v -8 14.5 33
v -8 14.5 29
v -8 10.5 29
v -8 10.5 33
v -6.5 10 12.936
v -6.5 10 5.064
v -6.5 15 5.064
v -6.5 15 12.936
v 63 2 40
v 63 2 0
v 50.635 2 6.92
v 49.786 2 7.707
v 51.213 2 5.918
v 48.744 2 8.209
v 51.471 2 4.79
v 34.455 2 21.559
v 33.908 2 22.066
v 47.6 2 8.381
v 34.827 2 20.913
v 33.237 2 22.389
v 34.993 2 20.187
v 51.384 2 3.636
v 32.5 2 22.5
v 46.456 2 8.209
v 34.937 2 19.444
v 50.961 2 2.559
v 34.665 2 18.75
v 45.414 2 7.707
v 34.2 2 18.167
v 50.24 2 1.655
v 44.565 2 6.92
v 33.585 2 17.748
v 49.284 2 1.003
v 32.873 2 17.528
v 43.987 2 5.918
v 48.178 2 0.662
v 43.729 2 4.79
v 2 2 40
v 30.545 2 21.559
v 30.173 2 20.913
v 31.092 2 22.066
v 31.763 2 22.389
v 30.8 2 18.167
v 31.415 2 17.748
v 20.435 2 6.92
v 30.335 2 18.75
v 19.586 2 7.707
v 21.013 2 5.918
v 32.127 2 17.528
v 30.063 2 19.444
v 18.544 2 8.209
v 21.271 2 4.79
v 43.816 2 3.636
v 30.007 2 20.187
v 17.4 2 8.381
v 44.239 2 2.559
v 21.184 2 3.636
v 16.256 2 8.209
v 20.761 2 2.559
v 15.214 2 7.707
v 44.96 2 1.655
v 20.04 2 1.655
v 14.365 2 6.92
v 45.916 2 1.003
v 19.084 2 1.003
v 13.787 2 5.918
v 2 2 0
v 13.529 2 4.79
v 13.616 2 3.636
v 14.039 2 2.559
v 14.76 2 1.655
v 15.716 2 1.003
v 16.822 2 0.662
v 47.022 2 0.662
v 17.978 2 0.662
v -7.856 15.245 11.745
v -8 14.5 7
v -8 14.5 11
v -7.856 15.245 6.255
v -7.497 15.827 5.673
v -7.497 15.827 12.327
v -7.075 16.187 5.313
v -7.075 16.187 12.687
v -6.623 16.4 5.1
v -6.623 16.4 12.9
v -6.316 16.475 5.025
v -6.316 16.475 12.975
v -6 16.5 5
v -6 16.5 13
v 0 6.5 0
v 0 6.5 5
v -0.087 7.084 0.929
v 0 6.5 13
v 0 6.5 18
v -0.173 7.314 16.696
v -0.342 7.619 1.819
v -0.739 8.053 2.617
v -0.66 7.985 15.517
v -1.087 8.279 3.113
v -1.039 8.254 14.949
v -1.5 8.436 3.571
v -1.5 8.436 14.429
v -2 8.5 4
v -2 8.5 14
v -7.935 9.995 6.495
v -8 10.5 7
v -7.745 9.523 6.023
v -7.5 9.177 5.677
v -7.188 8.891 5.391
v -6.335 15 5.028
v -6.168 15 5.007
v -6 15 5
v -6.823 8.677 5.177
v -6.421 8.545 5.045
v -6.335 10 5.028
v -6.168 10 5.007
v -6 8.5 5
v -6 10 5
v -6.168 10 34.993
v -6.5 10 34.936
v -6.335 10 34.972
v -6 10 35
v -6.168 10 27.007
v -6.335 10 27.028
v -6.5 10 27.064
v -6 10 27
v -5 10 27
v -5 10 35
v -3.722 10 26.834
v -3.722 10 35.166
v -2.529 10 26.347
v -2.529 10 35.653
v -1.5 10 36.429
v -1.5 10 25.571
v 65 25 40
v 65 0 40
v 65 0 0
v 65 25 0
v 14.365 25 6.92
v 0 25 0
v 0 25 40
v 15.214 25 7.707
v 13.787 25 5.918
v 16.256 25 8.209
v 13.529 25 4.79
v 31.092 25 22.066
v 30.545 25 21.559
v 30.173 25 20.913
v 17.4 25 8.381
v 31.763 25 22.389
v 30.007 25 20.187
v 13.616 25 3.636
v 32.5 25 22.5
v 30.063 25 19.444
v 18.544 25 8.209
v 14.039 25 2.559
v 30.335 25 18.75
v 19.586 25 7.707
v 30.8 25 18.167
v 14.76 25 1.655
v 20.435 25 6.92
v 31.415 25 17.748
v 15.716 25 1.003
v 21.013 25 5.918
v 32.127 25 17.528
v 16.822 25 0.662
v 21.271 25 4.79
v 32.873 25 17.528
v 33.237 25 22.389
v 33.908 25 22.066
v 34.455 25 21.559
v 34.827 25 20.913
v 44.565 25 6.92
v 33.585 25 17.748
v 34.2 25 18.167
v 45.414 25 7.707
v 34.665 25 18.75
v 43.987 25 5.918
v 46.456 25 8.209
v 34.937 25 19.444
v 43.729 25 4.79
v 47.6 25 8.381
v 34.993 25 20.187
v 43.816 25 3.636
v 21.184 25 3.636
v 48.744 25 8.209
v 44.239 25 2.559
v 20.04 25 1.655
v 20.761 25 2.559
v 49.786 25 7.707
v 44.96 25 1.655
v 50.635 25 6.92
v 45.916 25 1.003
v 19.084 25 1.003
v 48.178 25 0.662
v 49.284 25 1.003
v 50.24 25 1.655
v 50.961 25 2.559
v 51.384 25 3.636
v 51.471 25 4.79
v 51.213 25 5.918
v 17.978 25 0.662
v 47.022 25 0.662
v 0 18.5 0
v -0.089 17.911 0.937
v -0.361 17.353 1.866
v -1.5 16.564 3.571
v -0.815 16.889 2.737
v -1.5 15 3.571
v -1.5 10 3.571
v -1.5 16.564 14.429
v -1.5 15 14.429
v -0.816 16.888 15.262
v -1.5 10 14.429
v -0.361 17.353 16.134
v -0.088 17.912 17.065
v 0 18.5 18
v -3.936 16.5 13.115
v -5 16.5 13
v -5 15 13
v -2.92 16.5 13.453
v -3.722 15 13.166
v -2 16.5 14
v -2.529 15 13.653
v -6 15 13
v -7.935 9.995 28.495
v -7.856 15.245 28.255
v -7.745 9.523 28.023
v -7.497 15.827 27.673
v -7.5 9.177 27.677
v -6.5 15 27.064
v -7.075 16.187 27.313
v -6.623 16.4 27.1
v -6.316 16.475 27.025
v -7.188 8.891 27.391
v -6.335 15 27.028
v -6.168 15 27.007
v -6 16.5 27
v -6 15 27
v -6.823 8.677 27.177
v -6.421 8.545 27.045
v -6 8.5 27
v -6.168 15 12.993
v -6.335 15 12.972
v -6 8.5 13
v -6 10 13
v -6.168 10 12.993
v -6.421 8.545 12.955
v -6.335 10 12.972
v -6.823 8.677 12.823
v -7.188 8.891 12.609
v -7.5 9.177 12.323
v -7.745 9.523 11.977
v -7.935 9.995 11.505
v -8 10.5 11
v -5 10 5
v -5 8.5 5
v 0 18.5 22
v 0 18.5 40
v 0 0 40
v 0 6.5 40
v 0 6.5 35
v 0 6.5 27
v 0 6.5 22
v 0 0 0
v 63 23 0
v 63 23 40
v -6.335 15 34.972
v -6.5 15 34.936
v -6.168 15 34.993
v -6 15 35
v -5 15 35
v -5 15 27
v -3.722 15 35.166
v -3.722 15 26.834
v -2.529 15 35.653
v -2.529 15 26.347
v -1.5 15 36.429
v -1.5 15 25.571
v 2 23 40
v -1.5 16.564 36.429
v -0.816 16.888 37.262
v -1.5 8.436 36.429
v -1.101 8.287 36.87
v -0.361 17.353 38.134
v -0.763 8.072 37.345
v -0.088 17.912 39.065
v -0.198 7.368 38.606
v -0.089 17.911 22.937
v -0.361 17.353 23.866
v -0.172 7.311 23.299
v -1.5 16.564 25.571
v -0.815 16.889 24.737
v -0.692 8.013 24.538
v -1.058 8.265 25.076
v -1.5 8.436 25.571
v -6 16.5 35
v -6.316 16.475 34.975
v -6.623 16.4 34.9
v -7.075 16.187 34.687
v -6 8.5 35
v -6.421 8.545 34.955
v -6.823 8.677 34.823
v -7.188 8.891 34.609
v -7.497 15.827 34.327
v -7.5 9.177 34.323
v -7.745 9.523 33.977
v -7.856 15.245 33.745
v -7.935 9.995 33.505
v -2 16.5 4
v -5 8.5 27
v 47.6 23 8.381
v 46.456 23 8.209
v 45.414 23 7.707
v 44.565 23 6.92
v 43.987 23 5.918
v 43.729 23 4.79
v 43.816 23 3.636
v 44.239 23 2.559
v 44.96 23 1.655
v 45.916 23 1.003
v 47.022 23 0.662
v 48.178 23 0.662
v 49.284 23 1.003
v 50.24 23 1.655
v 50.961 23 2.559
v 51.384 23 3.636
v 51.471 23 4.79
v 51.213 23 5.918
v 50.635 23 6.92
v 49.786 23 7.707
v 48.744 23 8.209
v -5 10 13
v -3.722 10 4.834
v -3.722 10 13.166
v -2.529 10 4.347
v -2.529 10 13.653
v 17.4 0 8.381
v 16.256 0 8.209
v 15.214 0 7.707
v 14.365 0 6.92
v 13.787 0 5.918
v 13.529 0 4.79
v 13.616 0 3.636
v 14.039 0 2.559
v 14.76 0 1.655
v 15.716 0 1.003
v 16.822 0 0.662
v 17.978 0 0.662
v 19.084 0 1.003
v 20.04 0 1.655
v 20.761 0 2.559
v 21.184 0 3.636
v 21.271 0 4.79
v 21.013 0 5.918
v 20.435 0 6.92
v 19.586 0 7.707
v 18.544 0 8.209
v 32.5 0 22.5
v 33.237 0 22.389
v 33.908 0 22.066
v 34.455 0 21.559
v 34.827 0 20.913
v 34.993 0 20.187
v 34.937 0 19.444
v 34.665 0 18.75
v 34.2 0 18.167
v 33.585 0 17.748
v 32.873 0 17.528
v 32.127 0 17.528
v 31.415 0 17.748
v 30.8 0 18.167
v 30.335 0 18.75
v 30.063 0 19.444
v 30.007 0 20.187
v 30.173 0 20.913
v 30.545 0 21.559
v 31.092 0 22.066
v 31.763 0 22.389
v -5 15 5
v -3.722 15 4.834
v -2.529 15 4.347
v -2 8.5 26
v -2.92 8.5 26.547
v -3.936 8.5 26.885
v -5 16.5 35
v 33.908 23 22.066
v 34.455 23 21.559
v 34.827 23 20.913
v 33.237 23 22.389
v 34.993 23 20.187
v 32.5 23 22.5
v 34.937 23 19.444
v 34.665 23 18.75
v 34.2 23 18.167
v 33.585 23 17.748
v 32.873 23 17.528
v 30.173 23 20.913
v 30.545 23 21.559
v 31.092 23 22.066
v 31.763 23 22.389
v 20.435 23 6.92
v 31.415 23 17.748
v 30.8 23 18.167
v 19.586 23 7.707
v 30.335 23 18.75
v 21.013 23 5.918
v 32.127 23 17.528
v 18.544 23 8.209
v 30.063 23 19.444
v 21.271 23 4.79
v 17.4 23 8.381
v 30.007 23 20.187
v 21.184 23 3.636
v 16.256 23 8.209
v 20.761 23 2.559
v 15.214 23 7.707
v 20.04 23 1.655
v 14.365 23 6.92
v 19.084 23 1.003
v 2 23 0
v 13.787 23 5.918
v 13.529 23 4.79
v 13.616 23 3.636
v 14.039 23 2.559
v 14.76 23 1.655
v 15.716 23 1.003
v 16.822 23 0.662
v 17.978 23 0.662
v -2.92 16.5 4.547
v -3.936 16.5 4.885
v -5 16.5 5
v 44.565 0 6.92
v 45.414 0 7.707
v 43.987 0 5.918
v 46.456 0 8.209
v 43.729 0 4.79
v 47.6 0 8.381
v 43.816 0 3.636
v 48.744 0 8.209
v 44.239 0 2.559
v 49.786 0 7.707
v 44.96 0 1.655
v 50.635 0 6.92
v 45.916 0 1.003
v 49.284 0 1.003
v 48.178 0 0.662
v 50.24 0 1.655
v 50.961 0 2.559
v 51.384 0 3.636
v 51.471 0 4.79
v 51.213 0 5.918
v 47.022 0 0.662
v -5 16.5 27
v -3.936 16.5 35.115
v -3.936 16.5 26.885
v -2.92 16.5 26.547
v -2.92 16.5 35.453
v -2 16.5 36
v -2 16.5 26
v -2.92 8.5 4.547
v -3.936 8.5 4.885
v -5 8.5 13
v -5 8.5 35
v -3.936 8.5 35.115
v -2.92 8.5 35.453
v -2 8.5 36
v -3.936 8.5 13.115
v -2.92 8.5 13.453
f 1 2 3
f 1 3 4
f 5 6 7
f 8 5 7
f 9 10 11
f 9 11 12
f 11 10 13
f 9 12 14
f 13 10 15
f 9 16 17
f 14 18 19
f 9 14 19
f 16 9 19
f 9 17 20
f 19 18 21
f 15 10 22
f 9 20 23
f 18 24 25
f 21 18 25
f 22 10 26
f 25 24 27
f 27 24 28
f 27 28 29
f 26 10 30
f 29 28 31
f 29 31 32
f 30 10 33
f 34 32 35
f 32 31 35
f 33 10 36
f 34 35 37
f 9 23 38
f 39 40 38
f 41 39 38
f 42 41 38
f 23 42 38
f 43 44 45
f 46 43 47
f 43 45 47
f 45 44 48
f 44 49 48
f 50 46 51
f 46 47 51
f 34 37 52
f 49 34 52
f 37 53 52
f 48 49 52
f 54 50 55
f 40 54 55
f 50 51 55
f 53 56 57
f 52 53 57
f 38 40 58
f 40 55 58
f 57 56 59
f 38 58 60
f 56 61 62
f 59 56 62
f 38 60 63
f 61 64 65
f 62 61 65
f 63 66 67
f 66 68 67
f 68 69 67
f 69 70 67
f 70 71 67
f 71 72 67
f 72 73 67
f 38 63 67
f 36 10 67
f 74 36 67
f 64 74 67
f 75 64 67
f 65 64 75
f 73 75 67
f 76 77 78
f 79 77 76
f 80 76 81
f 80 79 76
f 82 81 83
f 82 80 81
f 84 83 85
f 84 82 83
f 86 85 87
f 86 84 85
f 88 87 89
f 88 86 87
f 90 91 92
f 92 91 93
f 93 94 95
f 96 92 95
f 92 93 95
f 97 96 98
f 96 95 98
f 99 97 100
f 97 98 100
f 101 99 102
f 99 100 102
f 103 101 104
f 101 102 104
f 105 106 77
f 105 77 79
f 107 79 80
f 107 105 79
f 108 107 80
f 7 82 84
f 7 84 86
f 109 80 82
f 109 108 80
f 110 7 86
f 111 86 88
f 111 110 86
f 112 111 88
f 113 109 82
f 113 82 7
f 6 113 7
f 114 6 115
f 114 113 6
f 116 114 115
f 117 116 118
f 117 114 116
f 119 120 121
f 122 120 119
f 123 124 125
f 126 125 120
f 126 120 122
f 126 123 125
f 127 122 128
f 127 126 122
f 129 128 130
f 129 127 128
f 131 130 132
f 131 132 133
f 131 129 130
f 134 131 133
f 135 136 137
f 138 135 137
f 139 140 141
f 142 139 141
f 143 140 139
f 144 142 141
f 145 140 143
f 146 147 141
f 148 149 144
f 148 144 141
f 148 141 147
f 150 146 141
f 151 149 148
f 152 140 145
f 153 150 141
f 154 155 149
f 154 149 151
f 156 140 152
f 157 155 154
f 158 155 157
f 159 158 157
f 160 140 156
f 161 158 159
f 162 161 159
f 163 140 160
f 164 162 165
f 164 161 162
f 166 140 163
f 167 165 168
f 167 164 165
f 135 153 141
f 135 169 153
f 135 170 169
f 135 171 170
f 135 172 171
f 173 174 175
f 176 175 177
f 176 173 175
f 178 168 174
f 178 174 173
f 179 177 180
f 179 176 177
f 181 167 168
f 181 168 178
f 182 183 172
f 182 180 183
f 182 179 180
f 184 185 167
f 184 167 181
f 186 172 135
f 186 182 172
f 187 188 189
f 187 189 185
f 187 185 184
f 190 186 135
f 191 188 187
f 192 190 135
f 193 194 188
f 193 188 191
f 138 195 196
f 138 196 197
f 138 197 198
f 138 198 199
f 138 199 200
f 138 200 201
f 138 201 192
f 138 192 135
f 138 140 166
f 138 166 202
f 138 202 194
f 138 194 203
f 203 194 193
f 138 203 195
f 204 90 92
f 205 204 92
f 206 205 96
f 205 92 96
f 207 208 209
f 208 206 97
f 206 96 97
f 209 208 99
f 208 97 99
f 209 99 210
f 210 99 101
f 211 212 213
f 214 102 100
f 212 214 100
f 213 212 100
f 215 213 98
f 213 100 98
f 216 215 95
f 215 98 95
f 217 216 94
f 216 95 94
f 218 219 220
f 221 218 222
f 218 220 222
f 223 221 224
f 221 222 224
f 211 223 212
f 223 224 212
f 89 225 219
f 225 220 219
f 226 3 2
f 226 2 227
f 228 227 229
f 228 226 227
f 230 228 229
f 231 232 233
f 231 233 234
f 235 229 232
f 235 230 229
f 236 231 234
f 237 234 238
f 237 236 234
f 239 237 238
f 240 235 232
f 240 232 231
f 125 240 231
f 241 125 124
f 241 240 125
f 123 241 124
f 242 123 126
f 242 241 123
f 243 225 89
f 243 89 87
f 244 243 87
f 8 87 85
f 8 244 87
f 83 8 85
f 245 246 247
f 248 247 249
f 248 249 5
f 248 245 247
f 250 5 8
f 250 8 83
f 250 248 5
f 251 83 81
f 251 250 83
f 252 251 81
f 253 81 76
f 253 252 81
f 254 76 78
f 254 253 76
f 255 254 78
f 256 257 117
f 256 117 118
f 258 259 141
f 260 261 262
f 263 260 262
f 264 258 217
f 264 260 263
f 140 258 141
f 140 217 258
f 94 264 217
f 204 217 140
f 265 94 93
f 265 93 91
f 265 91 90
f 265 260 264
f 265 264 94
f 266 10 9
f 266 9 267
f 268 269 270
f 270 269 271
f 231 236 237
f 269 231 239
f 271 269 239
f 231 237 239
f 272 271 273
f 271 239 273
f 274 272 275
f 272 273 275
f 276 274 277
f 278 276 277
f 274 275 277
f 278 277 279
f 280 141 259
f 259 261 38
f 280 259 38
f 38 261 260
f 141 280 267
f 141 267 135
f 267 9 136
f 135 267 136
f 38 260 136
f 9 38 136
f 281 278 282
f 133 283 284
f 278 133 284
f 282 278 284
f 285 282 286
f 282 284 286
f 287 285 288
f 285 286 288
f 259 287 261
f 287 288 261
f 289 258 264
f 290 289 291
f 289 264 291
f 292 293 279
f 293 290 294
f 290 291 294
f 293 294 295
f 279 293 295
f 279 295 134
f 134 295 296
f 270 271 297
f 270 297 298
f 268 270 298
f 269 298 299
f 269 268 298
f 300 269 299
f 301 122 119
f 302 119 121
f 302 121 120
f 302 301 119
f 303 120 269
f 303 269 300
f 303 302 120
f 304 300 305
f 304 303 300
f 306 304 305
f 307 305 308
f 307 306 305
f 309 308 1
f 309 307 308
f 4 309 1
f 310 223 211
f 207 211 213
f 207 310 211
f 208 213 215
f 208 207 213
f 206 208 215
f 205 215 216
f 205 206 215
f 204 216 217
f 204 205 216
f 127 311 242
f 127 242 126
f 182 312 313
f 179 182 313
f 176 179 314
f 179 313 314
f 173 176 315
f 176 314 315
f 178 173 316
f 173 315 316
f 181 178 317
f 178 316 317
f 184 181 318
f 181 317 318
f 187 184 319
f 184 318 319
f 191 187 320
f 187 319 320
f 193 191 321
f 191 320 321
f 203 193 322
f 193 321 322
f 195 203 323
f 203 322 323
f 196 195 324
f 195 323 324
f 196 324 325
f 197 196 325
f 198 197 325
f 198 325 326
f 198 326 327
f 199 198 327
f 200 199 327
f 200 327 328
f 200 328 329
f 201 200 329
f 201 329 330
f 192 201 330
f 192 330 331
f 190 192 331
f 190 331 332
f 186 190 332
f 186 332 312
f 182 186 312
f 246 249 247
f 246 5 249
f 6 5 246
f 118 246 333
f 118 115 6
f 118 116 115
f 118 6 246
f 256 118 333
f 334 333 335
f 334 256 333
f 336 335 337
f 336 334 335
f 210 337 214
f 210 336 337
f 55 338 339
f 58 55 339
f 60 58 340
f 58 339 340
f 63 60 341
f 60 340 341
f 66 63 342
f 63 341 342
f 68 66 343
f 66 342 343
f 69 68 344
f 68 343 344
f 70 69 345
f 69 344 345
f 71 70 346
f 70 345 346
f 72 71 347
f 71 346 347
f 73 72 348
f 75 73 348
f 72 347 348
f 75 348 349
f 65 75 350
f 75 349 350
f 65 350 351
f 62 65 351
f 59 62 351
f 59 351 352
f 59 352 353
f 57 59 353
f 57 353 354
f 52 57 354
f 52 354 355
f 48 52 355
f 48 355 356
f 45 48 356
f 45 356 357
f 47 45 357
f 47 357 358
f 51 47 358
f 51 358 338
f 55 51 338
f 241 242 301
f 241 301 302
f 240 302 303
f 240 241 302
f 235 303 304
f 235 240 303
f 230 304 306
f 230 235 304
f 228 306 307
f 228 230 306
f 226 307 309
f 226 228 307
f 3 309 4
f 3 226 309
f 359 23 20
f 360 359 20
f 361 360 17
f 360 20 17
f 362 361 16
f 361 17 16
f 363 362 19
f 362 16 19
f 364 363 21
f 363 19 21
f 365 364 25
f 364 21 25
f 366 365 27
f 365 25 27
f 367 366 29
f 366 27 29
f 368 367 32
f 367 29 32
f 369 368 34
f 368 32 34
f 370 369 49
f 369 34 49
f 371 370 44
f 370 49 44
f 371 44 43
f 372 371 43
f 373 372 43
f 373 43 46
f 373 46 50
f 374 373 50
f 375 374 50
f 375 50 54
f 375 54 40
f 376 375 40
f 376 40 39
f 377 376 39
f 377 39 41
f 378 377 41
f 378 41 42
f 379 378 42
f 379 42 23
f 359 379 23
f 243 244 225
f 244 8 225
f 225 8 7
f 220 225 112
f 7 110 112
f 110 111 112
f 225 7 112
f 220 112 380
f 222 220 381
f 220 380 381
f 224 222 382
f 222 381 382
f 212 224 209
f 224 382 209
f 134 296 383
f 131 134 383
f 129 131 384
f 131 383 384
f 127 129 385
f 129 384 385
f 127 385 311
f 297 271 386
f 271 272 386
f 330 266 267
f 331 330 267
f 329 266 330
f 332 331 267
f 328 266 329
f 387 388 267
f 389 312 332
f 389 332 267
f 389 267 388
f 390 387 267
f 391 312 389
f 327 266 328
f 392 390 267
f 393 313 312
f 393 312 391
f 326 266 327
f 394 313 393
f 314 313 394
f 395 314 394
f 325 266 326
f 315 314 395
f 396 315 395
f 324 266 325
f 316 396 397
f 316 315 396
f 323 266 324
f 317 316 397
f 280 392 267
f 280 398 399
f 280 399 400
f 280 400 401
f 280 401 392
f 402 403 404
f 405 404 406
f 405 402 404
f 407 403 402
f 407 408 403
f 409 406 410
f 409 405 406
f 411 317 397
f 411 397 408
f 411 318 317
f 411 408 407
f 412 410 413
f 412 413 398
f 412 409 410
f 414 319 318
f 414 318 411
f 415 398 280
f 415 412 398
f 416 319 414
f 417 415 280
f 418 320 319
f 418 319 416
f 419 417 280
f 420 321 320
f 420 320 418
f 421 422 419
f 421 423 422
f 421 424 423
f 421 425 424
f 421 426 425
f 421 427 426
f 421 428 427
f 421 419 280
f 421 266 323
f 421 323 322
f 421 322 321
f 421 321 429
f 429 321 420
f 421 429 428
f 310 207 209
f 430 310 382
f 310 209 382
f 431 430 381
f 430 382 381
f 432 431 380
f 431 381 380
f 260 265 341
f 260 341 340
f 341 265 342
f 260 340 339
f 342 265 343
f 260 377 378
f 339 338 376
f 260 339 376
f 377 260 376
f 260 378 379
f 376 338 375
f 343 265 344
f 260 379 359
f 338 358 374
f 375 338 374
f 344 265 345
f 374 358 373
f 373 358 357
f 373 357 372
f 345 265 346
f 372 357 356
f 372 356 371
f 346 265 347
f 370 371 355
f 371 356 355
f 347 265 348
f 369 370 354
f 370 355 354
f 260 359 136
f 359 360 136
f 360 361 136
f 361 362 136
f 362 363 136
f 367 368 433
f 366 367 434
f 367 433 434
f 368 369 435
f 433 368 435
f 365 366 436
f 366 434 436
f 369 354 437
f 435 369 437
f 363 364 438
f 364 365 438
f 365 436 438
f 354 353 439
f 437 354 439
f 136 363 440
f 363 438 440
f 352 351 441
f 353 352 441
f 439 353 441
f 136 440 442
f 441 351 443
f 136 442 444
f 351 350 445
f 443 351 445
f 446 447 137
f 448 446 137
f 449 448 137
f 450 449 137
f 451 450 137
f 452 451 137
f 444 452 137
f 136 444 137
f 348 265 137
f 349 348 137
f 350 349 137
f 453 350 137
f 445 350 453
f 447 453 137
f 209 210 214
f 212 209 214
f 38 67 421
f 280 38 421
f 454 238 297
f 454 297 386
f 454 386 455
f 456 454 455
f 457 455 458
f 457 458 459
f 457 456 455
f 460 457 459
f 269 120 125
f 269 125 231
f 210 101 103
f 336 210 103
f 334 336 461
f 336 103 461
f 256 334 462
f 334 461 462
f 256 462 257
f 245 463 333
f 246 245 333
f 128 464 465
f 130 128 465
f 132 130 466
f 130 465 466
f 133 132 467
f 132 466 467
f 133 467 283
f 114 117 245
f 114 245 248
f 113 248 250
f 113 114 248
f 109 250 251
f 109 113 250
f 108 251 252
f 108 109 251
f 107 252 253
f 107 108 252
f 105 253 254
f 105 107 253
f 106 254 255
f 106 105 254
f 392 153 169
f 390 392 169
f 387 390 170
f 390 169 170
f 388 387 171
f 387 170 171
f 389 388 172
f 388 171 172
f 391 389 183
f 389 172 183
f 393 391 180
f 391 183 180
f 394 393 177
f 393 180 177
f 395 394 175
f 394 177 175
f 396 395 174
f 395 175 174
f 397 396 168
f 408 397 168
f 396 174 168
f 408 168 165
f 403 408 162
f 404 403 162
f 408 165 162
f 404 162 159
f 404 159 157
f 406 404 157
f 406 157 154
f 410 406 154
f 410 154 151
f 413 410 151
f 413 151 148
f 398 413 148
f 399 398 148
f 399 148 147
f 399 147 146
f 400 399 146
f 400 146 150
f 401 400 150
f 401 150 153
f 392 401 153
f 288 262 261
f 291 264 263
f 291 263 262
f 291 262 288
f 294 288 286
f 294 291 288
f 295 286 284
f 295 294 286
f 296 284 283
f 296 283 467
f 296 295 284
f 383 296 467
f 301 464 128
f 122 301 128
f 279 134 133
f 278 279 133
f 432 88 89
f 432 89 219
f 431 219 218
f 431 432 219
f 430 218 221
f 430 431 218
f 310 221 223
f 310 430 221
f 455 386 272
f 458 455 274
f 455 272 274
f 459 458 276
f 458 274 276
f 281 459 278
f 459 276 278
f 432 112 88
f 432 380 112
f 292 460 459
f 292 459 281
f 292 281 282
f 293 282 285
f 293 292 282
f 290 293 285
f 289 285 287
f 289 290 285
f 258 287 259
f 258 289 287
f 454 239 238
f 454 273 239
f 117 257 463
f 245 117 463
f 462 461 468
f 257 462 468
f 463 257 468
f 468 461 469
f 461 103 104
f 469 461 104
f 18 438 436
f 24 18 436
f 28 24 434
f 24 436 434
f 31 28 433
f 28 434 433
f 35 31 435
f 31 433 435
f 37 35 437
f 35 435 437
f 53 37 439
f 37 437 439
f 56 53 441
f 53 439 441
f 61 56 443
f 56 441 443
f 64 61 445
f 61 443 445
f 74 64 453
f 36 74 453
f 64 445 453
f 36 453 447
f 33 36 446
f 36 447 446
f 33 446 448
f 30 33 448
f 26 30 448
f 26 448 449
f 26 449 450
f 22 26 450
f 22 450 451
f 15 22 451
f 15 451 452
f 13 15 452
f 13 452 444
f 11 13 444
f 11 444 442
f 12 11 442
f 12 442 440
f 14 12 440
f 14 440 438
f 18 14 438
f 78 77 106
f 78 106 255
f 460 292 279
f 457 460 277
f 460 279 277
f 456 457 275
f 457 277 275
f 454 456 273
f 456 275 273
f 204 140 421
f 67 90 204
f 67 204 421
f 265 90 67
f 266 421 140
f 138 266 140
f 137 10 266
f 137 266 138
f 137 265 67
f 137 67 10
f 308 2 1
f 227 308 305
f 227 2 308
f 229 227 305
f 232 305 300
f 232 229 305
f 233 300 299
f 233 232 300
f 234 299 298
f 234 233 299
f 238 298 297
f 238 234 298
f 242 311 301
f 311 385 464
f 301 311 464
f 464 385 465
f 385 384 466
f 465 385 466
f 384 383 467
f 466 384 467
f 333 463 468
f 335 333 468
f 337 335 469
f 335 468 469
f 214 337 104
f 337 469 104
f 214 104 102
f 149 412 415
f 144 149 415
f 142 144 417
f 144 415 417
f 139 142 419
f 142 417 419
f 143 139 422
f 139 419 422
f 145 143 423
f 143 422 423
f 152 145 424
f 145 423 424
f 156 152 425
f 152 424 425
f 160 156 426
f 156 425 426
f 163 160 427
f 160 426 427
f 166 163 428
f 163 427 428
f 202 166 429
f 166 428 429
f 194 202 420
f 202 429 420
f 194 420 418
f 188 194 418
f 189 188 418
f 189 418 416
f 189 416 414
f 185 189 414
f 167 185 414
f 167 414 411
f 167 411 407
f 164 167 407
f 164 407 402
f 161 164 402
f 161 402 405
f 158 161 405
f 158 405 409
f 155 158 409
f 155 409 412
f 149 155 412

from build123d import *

# Parameters (mm, degrees)
SKETCH1_W           = 65
SKETCH1_H           = 40
BOSS_EXTRUDE1_DEPTH = 25
SKETCH8_W           = 61
SKETCH8_H           = 21
CUT_EXTRUDE1_DEPTH  = 40
SKETCH9_R           = 2.5
CUT_EXTRUDE2_DEPTH  = 30
SKETCH10_R          = 3.881431072
CUT_EXTRUDE3_DEPTH  = 26
SKETCH11_W          = 8
SKETCH11_H          = 8
BOSS_EXTRUDE2_DEPTH = 8
SKETCH12_W          = 5
SKETCH12_H          = 5
CUT_EXTRUDE4_DEPTH  = 52
FILLET1_R           = 2
FILLET2_START       = 6.4999999
FILLET2_DEPTH       = 12.0000001
FILLET2_START_2     = 7.897261538
FILLET2_2_DEPTH     = 2.102738462
FILLET2_START_3     = 15
FILLET2_3_DEPTH     = 2.089446154
FILLET2_START_4     = -1
FILLET2_4_DEPTH     = 42
FILLET3_START       = 5
FILLET3_DEPTH       = 30
FILLET3_START_2     = 8
FILLET3_2_DEPTH     = 9


with BuildPart() as part:
    # Sketch1 → Boss-Extrude1 (new body)
    with BuildSketch(Plane(origin=(0, 0, 0), x_dir=(1, 0, 0), z_dir=(0, 1, 0))):
        with Locations((32.5, -20)):
            Rectangle(SKETCH1_W, SKETCH1_H)
    extrude(amount=BOSS_EXTRUDE1_DEPTH)

    # Sketch8 → Cut-Extrude1 (cut)
    with BuildSketch(Plane(origin=(0, 0, 0), x_dir=(-1, 0, 0), z_dir=(0, 0, -1))):
        with Locations((-32.5, 12.5)):
            Rectangle(SKETCH8_W, SKETCH8_H)
    extrude(amount=-CUT_EXTRUDE1_DEPTH, mode=Mode.SUBTRACT)

    # Sketch9 → Cut-Extrude2 (cut)
    with BuildSketch(Plane(origin=(0, 25, 0), x_dir=(1, 0, 0), z_dir=(0, 1, 0))):
        with Locations(Location((32.5, -20, 0), (0, 0, 270))):
            Circle(SKETCH9_R)
    extrude(amount=-CUT_EXTRUDE2_DEPTH, mode=Mode.SUBTRACT)

    # Sketch10 → Cut-Extrude3 (cut)
    with BuildSketch(Plane.XZ):
        with Locations(Location((17.4, 4.5, 0), (0, 0, 90))):
            Circle(SKETCH10_R)
        with Locations(Location((47.6, 4.5, 0), (0, 0, 90))):
            Circle(SKETCH10_R)
    extrude(amount=-CUT_EXTRUDE3_DEPTH, mode=Mode.SUBTRACT)

    # Sketch11 → Boss-Extrude2 (add)
    with BuildSketch(Plane.ZY):
        with Locations((9, 12.5)):
            Rectangle(SKETCH11_W, SKETCH11_H)
        with Locations((31, 12.5)):
            Rectangle(SKETCH11_W, SKETCH11_H)
    extrude(amount=BOSS_EXTRUDE2_DEPTH)

    # Sketch12 → Cut-Extrude4 (cut)
    with BuildSketch(Plane(origin=(0, 0, 5), x_dir=(-1, 0, 0), z_dir=(0, 0, -1))):
        with Locations((4, 12.5)):
            Rectangle(SKETCH12_W, SKETCH12_H)
    extrude(amount=-CUT_EXTRUDE4_DEPTH, mode=Mode.SUBTRACT)

    # Fillet1
    fillet1_edges = [part.edges().sort_by_distance(p)[0] for p in [
        (0, 8.5, 9),
        (0, 16.5, 9),
        (0, 8.5, 31),
        (0, 16.5, 31),
    ]]
    fillet(fillet1_edges, radius=FILLET1_R)

    # Fillet2: read off the stored shape, not the designer's step
    # Fillet2 outline → Fillet2 (add)
    with BuildSketch(Plane(origin=(0, 0, 0), x_dir=(1, 0, 0), z_dir=(0, 1, 0)).offset(FILLET2_START)):
        with BuildLine():
            ThreePointArc((-1.5, -14.429285786), (-0.390227771, -16.063508327), (0, -18))
            Line((0, -18), (0, -13))
            Line((0, -13), (-1.5, -13))
            Line((-1.5, -13), (-1.5, -14.429285786))
        make_face()
        with BuildLine():
            Line((-1.5, -35), (-1.5, -36.429285786))
            ThreePointArc((-1.5, -36.429285786), (-0.390227771, -38.063508327), (0, -40))
            Line((0, -40), (0, -35))
            Line((0, -35), (-1.5, -35))
        make_face()
        with BuildLine():
            Line((-1.5, -25.570714214), (-1.5, -27))
            Line((-1.5, -27), (0, -27))
            Line((0, -27), (0, -22))
            ThreePointArc((0, -22), (-0.390227771, -23.936491673), (-1.5, -25.570714214))
        make_face()
        with BuildLine():
            Line((-1.5, -5), (0, -5))
            Line((0, -5), (0, 0))
            ThreePointArc((0, 0), (-0.390227771, -1.936491673), (-1.5, -3.570714214))
            Line((-1.5, -3.570714214), (-1.5, -5))
        make_face()
    extrude(amount=FILLET2_DEPTH)

    # Fillet2 2 outline → Fillet2 2 (add)
    with BuildSketch(Plane(origin=(0, 0, 0), x_dir=(1, 0, 0), z_dir=(0, 1, 0)).offset(FILLET2_START_2)):
        with BuildLine():
            ThreePointArc((-5, -35), (-3.109705191, -35.371092404), (-1.5, -36.429285786))
            Line((-1.5, -36.429285786), (-1.5, -35))
            Line((-1.5, -35), (-5, -35))
        make_face()
        with BuildLine():
            Line((-5, -27), (-1.5, -27))
            Line((-1.5, -27), (-1.5, -25.570714214))
            ThreePointArc((-1.5, -25.570714214), (-3.109705191, -26.628907596), (-5, -27))
        make_face()
        with BuildLine():
            ThreePointArc((-5, -13), (-3.109705191, -13.371092404), (-1.5, -14.429285786))
            Line((-1.5, -14.429285786), (-1.5, -13))
            Line((-1.5, -13), (-5, -13))
        make_face()
        with BuildLine():
            Line((-5, -5), (-1.5, -5))
            Line((-1.5, -5), (-1.5, -3.570714214))
            ThreePointArc((-1.5, -3.570714214), (-3.109705191, -4.628907596), (-5, -5))
        make_face()
    extrude(amount=FILLET2_2_DEPTH)

    # Fillet2 3 outline → Fillet2 3 (add)
    with BuildSketch(Plane(origin=(0, 0, 0), x_dir=(1, 0, 0), z_dir=(0, 1, 0)).offset(FILLET2_START_3)):
        with BuildLine():
            ThreePointArc((-5, -35), (-3.109705191, -35.371092404), (-1.5, -36.429285786))
            Line((-1.5, -36.429285786), (-1.5, -35))
            Line((-1.5, -35), (-5, -35))
        make_face()
        with BuildLine():
            Line((-5, -27), (-1.5, -27))
            Line((-1.5, -27), (-1.5, -25.570714214))
            ThreePointArc((-1.5, -25.570714214), (-3.109705191, -26.628907596), (-5, -27))
        make_face()
        with BuildLine():
            ThreePointArc((-5, -13), (-3.109705191, -13.371092404), (-1.5, -14.429285786))
            Line((-1.5, -14.429285786), (-1.5, -13))
            Line((-1.5, -13), (-5, -13))
        make_face()
        with BuildLine():
            Line((-5, -5), (-1.5, -5))
            Line((-1.5, -5), (-1.5, -3.570714214))
            ThreePointArc((-1.5, -3.570714214), (-3.109705191, -4.628907596), (-5, -5))
        make_face()
    extrude(amount=FILLET2_3_DEPTH)

    # Fillet2 4 outline → Fillet2 4 (cut)
    with BuildSketch(Plane.XY.offset(FILLET2_START_4)):
        with BuildLine():
            Line((-5, 16.5), (-2, 16.5))
            ThreePointArc((-2, 16.5), (-0.585786438, 17.085786438), (0, 18.5))
            Line((0, 18.5), (-1.5, 18.5))
            Line((-1.5, 18.5), (-1.5, 17.089446154))
            Line((-1.5, 17.089446154), (-5, 17.089446154))
            Line((-5, 17.089446154), (-5, 16.5))
        make_face()
        with BuildLine():
            Line((-5, 7.897261538), (-1.5, 7.897261538))
            Line((-1.5, 7.897261538), (-1.5, 6.4999999))
            Line((-1.5, 6.4999999), (0, 6.49999995))
            ThreePointArc((0, 6.49999995), (-0.58578642, 7.914213545), (-2, 8.5))
            Line((-2, 8.5), (-5, 8.5))
            Line((-5, 8.5), (-5, 7.897261538))
        make_face()
    extrude(amount=FILLET2_4_DEPTH, mode=Mode.SUBTRACT)

    # Fillet3: read off the stored shape, not the designer's step
    # Fillet3 outline → Fillet3 (cut)
    with BuildSketch(Plane.XY.offset(FILLET3_START)):
        with BuildLine():
            Line((-8, 8.5), (-6, 8.5))
            ThreePointArc((-6, 8.5), (-7.414213562, 9.085786438), (-8, 10.5))
            Line((-8, 10.5), (-8, 8.5))
        make_face()
        with BuildLine():
            Line((-8, 16.5), (-8, 14.5))
            ThreePointArc((-8, 14.5), (-7.414213562, 15.914213562), (-6, 16.5))
            Line((-6, 16.5), (-8, 16.5))
        make_face()
    extrude(amount=FILLET3_DEPTH, mode=Mode.SUBTRACT)

    # Fillet3 2 outline → Fillet3 2 (cut)
    with BuildSketch(Plane(origin=(0, 0, 0), x_dir=(1, 0, 0), z_dir=(0, 1, 0)).offset(FILLET3_START_2)):
        with BuildLine():
            Line((-8, -35), (-6, -35))
            ThreePointArc((-6, -35), (-7.414213562, -34.414213562), (-8, -33))
            Line((-8, -33), (-8, -35))
        make_face()
        with BuildLine():
            Line((-8, -27), (-8, -29))
            ThreePointArc((-8, -29), (-7.414213562, -27.585786438), (-6, -27))
            Line((-6, -27), (-8, -27))
        make_face()
        with BuildLine():
            Line((-8, -13), (-6, -13))
            ThreePointArc((-6, -13), (-7.414213562, -12.414213562), (-8, -11))
            Line((-8, -11), (-8, -13))
        make_face()
        with BuildLine():
            Line((-8, -5), (-8, -7))
            ThreePointArc((-8, -7), (-7.414213562, -5.585786438), (-6, -5))
            Line((-6, -5), (-8, -5))
        make_face()
    extrude(amount=FILLET3_2_DEPTH, mode=Mode.SUBTRACT)


solid = part.part
